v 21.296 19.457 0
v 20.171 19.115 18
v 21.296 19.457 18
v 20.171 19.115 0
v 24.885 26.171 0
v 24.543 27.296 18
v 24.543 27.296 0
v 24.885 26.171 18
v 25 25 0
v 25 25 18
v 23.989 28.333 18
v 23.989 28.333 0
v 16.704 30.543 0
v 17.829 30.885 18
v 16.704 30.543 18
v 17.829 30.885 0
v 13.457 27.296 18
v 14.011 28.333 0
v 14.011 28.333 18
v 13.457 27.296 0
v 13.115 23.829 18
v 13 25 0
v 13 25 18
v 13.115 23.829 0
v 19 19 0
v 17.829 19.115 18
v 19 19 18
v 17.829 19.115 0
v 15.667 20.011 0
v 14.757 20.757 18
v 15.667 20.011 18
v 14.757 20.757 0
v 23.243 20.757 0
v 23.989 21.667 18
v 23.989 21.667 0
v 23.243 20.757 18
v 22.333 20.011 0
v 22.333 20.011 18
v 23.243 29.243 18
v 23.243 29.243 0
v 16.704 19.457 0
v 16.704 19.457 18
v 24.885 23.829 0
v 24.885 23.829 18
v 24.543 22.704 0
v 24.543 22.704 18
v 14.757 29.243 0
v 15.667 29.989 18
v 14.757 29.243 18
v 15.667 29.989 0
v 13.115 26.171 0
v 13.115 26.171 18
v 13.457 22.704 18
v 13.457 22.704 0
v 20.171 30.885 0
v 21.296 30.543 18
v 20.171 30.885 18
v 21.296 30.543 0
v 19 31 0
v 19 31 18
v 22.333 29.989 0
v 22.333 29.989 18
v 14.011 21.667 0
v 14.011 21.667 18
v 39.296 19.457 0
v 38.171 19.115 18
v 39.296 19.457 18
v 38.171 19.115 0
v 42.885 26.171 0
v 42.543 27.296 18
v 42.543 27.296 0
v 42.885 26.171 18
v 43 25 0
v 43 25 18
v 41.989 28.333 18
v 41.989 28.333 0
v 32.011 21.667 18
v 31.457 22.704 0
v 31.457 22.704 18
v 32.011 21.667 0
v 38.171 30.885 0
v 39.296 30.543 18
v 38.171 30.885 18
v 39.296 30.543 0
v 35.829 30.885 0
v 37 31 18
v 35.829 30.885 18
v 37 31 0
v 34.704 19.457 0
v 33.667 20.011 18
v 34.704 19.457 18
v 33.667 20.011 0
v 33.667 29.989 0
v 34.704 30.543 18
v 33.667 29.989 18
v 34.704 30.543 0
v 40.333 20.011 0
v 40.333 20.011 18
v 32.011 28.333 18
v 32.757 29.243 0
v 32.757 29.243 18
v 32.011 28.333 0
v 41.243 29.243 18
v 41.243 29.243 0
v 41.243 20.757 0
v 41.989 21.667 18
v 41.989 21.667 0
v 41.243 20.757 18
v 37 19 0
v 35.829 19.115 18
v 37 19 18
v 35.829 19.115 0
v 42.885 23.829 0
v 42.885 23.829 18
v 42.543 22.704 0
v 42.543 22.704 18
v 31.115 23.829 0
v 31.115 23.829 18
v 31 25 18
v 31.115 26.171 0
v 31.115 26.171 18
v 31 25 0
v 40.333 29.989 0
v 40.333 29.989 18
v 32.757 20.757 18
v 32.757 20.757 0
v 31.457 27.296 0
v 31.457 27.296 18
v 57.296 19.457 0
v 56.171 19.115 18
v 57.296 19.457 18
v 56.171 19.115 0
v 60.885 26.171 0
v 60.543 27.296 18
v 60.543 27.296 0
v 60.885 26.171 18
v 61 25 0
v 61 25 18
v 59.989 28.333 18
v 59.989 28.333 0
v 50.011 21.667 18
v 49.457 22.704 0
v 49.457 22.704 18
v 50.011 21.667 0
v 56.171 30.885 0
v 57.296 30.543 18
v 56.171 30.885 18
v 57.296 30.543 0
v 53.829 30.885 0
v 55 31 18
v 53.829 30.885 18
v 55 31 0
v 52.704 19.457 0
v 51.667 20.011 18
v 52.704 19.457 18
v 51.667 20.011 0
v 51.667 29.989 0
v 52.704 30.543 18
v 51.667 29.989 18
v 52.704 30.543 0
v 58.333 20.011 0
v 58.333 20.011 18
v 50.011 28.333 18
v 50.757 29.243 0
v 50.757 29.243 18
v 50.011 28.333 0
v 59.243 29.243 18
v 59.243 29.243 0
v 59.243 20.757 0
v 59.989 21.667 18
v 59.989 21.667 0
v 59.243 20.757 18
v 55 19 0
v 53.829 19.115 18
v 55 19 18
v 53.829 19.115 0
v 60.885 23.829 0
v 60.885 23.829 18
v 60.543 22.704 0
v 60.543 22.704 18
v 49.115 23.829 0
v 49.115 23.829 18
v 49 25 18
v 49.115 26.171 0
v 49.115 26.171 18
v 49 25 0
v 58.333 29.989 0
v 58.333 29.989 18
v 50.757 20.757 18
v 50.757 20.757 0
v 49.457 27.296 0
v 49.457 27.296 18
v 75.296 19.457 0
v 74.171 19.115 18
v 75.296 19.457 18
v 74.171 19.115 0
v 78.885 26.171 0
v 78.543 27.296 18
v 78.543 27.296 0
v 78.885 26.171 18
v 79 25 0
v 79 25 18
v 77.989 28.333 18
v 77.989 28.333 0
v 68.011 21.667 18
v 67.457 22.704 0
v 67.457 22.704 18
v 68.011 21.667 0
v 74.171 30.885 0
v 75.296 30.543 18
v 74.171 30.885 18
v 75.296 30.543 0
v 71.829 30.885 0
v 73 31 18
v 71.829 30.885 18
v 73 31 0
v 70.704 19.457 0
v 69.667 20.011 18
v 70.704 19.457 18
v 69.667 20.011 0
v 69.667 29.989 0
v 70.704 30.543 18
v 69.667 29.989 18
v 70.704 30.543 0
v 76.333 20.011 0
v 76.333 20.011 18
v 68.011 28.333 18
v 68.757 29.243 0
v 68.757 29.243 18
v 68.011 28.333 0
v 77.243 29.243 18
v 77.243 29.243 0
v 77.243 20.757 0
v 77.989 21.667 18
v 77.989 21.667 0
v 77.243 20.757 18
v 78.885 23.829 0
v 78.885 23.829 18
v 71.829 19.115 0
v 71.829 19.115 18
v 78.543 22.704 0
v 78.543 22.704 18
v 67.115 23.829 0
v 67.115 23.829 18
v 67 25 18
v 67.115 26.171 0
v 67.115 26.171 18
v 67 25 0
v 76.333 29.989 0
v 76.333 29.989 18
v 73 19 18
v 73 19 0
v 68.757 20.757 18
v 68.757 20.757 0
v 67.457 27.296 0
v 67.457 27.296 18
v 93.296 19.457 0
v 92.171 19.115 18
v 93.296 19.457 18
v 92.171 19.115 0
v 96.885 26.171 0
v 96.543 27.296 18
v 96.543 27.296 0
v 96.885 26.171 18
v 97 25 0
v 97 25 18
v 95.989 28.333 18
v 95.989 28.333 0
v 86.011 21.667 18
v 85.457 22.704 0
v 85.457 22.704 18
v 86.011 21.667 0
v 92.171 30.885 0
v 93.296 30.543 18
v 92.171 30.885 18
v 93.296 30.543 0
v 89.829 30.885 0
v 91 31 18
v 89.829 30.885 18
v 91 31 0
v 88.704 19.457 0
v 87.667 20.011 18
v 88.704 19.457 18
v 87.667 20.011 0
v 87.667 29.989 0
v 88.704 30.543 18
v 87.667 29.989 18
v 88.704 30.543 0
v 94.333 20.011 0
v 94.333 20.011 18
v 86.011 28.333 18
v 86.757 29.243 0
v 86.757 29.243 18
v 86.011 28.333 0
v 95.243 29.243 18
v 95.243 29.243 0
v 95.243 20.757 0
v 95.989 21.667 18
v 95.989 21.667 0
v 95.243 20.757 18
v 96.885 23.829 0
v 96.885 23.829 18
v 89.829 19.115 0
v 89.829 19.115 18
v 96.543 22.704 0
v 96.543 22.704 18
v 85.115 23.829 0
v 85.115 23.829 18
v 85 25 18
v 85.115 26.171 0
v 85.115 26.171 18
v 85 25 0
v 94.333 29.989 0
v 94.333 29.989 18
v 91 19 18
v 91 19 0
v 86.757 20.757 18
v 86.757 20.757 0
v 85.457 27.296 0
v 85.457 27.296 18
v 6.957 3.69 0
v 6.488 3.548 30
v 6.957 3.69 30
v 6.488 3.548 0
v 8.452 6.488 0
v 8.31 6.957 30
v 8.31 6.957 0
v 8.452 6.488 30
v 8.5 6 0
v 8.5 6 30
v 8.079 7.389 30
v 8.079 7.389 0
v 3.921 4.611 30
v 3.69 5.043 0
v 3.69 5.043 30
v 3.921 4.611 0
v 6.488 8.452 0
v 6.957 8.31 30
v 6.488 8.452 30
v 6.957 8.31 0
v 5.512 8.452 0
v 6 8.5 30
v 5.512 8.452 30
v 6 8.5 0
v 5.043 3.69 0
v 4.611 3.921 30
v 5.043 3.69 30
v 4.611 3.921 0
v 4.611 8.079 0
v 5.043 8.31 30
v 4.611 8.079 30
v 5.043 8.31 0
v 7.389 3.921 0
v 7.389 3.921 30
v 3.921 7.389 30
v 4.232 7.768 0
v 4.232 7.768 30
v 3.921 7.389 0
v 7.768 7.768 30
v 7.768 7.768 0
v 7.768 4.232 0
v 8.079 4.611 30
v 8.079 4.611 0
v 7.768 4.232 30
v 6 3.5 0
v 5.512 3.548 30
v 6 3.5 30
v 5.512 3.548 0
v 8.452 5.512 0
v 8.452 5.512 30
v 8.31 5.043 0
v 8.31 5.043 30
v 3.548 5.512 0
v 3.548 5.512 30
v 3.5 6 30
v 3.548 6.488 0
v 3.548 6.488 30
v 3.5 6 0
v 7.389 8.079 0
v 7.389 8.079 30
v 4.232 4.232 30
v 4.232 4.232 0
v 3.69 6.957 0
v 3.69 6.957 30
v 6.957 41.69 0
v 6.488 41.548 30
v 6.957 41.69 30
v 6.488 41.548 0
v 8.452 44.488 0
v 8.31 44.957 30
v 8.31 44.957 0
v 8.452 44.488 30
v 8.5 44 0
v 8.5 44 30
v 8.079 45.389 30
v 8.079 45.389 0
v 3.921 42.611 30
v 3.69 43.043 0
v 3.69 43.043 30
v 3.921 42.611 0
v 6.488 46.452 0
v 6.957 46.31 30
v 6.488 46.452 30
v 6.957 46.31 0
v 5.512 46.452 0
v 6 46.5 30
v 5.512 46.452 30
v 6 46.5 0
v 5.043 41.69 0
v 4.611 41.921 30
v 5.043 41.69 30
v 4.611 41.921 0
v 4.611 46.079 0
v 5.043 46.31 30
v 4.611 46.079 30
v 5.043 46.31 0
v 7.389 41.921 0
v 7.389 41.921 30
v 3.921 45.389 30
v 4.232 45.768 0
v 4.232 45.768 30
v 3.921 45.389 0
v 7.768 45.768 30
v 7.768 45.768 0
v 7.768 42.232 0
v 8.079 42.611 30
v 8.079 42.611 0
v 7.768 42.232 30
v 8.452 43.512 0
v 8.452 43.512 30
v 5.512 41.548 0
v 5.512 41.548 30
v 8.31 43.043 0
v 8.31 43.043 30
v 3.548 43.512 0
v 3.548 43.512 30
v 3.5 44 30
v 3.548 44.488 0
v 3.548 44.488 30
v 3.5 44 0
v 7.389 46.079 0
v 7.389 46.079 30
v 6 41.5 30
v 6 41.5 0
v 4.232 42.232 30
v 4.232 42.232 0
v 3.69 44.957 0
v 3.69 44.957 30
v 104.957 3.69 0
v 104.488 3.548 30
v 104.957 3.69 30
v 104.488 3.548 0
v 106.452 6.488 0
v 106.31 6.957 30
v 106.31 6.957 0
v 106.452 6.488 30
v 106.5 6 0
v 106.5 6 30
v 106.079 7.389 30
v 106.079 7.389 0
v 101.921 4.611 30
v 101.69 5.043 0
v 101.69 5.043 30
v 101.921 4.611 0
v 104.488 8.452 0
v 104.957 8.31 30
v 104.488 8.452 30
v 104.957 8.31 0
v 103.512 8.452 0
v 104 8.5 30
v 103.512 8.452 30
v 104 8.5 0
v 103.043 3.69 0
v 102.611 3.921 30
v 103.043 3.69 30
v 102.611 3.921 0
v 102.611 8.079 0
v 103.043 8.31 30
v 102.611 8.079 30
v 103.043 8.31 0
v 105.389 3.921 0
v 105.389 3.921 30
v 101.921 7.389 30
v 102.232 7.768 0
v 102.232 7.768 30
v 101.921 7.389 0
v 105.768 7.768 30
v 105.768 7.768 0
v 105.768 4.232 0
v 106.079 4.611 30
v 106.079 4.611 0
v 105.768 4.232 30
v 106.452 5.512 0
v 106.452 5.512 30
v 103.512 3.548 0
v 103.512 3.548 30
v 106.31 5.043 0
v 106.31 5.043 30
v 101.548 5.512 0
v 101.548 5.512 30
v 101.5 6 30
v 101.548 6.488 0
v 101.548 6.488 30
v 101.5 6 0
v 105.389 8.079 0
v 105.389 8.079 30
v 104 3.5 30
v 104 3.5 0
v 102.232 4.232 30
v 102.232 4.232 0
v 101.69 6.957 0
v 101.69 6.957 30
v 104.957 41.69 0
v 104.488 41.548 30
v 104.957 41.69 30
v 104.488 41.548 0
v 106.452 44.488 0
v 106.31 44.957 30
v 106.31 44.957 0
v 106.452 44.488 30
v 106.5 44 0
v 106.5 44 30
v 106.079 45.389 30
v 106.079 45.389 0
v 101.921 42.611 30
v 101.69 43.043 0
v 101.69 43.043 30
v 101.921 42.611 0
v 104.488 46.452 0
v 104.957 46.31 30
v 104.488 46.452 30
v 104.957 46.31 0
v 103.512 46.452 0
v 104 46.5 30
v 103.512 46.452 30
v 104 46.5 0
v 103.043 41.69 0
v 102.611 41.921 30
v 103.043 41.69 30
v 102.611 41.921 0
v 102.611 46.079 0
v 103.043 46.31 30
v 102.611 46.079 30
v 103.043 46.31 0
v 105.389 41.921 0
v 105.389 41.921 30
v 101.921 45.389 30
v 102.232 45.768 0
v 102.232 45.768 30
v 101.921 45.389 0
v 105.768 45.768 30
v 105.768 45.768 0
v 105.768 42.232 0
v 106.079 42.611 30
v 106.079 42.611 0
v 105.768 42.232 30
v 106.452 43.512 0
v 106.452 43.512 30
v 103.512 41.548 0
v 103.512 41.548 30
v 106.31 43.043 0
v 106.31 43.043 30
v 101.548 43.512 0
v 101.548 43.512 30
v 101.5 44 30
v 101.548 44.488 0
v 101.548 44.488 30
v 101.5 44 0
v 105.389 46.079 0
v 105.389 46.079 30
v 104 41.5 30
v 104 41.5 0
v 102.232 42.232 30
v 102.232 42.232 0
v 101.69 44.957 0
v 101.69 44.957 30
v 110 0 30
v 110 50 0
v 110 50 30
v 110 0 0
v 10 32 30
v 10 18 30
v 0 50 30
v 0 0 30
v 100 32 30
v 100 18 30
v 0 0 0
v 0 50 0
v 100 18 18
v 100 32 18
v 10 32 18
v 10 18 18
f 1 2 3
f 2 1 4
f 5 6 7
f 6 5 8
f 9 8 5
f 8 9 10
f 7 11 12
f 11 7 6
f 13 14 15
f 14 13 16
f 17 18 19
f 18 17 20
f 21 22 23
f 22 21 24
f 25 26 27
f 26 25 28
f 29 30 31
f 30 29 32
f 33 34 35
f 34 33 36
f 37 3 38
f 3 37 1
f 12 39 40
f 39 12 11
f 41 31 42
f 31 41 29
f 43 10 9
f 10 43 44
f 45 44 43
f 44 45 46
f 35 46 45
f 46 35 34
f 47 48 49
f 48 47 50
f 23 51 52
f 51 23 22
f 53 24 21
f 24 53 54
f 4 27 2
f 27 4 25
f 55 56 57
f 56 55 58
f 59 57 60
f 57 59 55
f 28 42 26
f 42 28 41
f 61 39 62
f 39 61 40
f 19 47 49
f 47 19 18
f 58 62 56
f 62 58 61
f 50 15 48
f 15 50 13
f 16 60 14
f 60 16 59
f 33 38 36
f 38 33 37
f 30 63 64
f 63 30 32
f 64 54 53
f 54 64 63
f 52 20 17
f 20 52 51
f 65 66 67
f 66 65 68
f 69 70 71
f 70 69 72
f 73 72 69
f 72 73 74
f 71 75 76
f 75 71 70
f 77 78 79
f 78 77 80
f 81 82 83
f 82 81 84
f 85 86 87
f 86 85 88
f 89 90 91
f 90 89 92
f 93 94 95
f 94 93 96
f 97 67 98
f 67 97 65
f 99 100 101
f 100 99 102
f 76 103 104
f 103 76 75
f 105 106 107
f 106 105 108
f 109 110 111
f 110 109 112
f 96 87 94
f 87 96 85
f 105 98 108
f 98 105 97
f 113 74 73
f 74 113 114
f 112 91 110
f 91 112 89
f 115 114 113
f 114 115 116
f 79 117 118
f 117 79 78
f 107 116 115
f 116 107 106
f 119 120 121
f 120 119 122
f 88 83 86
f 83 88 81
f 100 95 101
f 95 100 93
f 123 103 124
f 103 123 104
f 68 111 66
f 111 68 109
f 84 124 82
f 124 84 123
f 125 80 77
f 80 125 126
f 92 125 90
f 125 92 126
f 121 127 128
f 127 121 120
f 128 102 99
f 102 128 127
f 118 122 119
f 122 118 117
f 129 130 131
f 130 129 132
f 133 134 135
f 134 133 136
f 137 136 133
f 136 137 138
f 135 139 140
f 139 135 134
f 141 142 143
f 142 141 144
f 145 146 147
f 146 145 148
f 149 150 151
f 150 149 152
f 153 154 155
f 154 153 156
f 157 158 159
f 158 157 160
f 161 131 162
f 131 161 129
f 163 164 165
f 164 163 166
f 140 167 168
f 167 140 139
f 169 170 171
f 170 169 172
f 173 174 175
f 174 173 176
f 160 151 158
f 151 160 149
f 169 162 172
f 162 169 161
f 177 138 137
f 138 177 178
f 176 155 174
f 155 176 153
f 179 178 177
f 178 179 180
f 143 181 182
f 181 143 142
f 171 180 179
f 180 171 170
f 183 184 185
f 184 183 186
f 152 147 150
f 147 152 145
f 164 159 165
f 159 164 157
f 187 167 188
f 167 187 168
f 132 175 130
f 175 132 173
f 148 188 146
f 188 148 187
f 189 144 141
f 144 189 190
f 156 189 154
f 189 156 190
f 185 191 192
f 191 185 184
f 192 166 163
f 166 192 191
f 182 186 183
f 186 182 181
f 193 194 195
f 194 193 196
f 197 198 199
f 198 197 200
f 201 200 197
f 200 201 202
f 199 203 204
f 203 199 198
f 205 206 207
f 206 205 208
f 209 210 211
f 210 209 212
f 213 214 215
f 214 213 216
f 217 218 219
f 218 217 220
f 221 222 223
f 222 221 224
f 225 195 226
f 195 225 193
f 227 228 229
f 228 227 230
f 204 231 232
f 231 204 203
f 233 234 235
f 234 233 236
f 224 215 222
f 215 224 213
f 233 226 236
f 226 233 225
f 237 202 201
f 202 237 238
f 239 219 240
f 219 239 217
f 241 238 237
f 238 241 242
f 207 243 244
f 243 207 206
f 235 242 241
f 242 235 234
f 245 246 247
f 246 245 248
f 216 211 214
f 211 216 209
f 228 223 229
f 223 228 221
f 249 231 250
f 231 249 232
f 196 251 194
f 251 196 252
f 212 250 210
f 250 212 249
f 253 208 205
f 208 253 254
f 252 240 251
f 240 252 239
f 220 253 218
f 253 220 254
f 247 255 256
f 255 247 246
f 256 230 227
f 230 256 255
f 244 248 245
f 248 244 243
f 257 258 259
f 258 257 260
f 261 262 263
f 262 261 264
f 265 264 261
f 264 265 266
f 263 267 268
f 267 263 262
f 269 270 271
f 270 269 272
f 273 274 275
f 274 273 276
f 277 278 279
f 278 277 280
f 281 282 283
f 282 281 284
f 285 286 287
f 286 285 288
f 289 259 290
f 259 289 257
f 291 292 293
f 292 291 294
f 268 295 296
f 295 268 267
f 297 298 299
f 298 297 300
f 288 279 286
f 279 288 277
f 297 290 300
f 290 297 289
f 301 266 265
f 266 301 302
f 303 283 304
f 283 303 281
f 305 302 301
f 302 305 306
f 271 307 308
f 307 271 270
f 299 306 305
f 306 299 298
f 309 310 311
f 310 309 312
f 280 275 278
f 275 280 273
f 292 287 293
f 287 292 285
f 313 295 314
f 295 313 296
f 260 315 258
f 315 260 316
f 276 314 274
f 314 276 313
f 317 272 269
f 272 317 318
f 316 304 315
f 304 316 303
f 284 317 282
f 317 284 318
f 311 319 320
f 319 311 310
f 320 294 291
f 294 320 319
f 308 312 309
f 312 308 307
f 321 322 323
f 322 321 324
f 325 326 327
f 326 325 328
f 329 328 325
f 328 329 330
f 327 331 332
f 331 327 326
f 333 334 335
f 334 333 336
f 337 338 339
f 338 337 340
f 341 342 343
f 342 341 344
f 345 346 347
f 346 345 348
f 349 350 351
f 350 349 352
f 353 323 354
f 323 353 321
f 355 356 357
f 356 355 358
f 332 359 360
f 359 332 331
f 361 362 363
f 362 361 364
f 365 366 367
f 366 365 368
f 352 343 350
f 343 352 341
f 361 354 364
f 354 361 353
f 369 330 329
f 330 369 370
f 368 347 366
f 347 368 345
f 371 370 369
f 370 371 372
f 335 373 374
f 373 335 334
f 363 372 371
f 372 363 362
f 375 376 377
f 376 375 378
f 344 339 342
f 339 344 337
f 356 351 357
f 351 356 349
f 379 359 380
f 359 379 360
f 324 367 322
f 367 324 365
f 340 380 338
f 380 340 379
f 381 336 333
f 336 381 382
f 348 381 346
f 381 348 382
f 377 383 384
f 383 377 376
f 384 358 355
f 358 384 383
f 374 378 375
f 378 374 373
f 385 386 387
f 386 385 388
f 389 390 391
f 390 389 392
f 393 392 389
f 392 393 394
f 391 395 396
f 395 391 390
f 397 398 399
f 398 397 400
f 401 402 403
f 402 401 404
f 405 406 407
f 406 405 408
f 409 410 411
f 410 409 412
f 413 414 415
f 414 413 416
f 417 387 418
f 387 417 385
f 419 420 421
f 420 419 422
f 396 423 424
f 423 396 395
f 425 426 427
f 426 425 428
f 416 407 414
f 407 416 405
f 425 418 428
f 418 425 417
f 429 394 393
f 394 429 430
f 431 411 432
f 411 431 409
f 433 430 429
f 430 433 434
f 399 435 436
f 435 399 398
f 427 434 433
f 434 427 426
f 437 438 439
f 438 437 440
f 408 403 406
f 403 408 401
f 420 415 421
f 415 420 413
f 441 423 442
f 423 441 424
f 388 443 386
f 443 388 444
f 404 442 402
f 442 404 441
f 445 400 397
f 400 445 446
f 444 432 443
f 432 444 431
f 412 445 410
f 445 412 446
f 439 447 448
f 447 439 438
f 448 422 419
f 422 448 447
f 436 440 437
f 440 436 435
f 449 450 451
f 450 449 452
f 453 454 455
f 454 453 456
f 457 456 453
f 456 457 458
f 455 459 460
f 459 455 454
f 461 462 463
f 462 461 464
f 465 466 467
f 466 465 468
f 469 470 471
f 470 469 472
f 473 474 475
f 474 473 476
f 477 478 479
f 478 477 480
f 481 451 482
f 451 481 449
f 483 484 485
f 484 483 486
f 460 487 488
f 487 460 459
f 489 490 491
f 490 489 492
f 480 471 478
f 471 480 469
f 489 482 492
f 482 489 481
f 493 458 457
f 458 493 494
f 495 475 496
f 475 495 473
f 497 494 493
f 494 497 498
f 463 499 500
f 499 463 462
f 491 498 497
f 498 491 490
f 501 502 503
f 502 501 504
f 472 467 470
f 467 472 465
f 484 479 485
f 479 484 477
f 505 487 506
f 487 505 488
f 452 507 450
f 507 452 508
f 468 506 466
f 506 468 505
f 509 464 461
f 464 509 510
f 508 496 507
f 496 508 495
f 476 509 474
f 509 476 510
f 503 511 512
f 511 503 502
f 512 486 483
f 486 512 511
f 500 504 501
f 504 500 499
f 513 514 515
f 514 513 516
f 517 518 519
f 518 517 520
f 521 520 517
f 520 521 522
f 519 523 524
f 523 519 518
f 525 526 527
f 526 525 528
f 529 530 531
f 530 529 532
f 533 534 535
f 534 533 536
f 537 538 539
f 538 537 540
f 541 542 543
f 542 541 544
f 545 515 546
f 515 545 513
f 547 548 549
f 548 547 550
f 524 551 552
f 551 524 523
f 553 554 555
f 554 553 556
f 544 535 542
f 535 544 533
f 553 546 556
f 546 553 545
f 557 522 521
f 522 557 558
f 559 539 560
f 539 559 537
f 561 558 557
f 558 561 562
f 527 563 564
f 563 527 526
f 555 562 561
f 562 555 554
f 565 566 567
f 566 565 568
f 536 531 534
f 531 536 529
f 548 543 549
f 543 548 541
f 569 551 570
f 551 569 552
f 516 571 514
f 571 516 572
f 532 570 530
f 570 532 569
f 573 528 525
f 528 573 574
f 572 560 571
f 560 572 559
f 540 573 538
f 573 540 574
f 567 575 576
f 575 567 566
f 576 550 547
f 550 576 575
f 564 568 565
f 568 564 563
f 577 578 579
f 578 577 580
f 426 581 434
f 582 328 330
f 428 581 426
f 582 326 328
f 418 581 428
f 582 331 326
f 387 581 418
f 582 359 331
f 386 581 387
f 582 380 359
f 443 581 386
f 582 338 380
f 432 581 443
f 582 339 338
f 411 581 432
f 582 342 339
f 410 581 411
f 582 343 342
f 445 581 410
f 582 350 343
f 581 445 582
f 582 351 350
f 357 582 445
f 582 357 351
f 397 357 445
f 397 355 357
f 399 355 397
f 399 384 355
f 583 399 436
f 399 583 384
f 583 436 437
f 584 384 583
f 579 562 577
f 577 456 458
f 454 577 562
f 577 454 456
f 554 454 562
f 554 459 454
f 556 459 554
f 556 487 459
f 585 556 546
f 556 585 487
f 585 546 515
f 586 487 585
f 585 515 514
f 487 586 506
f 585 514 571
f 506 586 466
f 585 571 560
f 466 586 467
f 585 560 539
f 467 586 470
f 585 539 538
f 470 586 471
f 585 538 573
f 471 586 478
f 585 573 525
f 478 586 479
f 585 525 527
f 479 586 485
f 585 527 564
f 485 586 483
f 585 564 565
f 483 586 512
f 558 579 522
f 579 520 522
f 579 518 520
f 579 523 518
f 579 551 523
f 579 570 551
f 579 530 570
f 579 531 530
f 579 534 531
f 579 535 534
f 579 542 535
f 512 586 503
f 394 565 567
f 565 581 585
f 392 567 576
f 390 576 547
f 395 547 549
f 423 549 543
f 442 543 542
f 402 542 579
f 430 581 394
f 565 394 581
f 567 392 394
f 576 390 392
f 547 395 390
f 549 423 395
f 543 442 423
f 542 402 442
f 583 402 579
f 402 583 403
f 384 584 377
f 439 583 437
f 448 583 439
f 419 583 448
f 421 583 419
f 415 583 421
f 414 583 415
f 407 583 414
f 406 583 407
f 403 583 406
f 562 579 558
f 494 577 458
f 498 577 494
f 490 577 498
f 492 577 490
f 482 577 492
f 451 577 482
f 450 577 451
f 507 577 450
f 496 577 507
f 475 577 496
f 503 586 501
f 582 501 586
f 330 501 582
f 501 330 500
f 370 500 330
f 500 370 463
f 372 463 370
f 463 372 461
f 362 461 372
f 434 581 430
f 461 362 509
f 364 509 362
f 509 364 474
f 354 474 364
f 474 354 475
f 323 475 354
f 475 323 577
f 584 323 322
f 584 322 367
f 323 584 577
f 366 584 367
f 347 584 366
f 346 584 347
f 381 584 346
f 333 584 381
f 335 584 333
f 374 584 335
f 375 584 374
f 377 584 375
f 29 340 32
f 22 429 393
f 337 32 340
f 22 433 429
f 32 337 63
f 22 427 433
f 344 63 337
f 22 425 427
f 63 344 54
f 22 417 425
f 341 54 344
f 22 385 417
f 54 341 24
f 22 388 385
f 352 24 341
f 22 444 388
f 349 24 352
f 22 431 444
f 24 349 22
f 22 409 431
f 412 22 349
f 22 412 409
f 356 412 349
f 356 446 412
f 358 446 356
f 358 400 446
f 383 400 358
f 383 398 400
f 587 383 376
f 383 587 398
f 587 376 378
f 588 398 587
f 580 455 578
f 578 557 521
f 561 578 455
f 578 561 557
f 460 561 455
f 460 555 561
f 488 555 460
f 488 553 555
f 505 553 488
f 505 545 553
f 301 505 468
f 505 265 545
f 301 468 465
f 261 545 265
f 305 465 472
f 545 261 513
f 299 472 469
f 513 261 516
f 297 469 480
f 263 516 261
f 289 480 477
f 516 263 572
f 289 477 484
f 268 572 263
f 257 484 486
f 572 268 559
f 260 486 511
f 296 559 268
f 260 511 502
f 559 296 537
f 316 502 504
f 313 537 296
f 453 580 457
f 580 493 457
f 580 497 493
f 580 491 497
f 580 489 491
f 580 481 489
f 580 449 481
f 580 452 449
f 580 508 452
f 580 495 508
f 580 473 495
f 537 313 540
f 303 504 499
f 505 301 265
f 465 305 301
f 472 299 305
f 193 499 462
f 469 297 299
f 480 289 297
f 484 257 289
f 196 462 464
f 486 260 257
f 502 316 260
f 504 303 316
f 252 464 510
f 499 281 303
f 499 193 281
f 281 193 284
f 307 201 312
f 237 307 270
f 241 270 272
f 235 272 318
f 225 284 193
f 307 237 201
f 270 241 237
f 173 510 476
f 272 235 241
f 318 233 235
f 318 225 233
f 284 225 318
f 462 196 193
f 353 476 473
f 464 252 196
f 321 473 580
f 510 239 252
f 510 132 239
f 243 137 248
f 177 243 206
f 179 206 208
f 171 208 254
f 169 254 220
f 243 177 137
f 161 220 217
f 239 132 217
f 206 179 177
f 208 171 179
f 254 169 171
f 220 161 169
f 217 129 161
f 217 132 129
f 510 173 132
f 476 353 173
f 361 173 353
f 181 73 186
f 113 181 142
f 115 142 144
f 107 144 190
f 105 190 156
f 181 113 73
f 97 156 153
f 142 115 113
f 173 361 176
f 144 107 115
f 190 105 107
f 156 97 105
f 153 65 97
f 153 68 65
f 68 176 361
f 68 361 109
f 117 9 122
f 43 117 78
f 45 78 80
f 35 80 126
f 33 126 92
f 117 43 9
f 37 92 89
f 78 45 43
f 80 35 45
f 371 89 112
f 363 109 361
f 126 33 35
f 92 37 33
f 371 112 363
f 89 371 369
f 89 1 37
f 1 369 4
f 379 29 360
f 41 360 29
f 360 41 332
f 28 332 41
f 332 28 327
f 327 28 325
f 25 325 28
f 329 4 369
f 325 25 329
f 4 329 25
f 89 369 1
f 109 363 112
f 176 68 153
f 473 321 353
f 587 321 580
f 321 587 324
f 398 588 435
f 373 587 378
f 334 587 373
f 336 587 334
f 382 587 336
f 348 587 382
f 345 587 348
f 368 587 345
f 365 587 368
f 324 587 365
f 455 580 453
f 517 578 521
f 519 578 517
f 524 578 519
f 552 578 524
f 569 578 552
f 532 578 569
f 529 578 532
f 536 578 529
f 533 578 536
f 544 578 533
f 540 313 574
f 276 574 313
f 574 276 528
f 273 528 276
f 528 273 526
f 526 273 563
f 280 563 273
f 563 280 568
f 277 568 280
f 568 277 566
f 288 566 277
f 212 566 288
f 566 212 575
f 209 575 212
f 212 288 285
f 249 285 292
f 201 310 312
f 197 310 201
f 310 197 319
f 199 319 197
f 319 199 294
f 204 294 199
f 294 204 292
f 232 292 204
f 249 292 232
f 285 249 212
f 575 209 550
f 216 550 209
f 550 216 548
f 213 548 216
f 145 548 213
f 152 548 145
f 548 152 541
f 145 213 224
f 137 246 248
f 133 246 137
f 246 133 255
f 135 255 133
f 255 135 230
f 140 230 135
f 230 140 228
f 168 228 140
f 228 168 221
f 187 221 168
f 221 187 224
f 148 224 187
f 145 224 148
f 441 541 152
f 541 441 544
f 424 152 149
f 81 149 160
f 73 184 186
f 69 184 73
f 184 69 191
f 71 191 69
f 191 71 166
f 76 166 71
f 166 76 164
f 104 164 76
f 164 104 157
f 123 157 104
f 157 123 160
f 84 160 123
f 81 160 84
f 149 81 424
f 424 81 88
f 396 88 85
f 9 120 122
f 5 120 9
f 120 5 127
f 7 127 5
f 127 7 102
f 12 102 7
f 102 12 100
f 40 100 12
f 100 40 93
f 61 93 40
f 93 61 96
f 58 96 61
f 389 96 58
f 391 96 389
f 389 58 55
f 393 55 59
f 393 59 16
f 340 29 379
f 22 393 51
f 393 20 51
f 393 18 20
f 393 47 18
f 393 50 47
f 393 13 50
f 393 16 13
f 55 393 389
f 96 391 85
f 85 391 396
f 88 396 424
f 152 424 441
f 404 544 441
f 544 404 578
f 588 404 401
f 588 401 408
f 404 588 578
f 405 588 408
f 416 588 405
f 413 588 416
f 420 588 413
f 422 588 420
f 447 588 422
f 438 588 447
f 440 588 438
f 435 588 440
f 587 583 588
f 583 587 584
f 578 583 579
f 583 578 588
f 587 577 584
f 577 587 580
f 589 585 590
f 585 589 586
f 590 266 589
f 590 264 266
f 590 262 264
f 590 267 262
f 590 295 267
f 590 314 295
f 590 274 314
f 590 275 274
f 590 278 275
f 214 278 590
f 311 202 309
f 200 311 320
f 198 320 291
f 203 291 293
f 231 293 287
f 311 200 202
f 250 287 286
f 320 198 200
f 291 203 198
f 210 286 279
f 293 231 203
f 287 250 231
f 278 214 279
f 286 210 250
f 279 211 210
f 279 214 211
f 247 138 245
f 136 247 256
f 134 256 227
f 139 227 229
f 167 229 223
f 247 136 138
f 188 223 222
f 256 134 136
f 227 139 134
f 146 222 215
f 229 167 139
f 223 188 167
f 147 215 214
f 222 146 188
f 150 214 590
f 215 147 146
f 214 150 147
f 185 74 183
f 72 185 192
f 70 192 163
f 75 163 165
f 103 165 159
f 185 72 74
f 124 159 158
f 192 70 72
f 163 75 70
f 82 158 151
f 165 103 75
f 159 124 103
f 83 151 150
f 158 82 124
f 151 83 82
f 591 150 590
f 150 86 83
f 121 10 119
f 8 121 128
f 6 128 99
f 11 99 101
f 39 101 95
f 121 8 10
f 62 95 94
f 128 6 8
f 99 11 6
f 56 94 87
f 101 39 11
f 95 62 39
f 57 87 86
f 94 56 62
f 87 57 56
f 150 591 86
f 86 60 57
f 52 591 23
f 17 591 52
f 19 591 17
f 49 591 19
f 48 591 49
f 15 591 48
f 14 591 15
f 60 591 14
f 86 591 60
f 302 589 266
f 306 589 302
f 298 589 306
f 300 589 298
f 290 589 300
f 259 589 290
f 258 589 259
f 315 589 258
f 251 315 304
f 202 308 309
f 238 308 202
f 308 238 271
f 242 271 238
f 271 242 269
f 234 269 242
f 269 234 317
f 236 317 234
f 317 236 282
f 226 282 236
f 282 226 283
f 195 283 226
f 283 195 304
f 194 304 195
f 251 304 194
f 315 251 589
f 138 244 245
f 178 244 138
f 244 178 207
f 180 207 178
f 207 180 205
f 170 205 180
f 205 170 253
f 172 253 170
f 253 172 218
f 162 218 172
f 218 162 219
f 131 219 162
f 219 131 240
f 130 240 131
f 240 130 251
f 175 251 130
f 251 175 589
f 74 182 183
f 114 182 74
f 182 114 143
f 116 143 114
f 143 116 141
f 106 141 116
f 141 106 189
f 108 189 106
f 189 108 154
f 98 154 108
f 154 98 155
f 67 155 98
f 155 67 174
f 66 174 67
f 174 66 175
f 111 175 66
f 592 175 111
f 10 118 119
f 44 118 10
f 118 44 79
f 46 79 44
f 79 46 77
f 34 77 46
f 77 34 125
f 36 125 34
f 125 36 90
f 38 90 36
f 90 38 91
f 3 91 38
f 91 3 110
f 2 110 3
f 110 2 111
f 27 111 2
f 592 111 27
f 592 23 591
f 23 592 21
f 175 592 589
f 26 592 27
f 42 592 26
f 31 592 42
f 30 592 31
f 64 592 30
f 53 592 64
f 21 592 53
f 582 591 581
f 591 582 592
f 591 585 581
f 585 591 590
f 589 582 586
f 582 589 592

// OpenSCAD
$fn = 32;

// ----------------------------------------------------------------------
// Manifold block: gallery_top manifold
// ----------------------------------------------------------------------

// --- parameters (mm) ---
block_l = 110;            // block length, X
block_w = 50;             // block width, Y
block_h = 30;             // block height, Z
port_d = 12;              // port bore diameter
port_pitch = 18;          // port pitch along X
gallery_d = 14;           // top gallery width, Y
gallery_depth = 12;       // gallery pocket depth
wall_p = 10;              // gallery end wall thickness, X
mnt_d = 5;                // mounting hole diameter
mnt_in = 6;               // mounting hole inset from the edges

n_ports = 5;  // ports in the row
port_x0 = (block_l - (n_ports - 1) * port_pitch) / 2;  // first port X

difference() {
  cube([block_l, block_w, block_h]);
  for (i = [0 : n_ports - 1])
    translate([port_x0 + i * port_pitch, block_w / 2, -1])
      cylinder(h = block_h + 2, d = port_d);
  translate([wall_p, block_w / 2 - gallery_d / 2, block_h - gallery_depth])
    cube([block_l - 2 * wall_p, gallery_d, gallery_depth + 1]);
  for (cx = [mnt_in, block_l - mnt_in])
    for (cy = [mnt_in, block_w - mnt_in])
      translate([cx, cy, -1]) cylinder(h = block_h + 2, d = mnt_d);
}
